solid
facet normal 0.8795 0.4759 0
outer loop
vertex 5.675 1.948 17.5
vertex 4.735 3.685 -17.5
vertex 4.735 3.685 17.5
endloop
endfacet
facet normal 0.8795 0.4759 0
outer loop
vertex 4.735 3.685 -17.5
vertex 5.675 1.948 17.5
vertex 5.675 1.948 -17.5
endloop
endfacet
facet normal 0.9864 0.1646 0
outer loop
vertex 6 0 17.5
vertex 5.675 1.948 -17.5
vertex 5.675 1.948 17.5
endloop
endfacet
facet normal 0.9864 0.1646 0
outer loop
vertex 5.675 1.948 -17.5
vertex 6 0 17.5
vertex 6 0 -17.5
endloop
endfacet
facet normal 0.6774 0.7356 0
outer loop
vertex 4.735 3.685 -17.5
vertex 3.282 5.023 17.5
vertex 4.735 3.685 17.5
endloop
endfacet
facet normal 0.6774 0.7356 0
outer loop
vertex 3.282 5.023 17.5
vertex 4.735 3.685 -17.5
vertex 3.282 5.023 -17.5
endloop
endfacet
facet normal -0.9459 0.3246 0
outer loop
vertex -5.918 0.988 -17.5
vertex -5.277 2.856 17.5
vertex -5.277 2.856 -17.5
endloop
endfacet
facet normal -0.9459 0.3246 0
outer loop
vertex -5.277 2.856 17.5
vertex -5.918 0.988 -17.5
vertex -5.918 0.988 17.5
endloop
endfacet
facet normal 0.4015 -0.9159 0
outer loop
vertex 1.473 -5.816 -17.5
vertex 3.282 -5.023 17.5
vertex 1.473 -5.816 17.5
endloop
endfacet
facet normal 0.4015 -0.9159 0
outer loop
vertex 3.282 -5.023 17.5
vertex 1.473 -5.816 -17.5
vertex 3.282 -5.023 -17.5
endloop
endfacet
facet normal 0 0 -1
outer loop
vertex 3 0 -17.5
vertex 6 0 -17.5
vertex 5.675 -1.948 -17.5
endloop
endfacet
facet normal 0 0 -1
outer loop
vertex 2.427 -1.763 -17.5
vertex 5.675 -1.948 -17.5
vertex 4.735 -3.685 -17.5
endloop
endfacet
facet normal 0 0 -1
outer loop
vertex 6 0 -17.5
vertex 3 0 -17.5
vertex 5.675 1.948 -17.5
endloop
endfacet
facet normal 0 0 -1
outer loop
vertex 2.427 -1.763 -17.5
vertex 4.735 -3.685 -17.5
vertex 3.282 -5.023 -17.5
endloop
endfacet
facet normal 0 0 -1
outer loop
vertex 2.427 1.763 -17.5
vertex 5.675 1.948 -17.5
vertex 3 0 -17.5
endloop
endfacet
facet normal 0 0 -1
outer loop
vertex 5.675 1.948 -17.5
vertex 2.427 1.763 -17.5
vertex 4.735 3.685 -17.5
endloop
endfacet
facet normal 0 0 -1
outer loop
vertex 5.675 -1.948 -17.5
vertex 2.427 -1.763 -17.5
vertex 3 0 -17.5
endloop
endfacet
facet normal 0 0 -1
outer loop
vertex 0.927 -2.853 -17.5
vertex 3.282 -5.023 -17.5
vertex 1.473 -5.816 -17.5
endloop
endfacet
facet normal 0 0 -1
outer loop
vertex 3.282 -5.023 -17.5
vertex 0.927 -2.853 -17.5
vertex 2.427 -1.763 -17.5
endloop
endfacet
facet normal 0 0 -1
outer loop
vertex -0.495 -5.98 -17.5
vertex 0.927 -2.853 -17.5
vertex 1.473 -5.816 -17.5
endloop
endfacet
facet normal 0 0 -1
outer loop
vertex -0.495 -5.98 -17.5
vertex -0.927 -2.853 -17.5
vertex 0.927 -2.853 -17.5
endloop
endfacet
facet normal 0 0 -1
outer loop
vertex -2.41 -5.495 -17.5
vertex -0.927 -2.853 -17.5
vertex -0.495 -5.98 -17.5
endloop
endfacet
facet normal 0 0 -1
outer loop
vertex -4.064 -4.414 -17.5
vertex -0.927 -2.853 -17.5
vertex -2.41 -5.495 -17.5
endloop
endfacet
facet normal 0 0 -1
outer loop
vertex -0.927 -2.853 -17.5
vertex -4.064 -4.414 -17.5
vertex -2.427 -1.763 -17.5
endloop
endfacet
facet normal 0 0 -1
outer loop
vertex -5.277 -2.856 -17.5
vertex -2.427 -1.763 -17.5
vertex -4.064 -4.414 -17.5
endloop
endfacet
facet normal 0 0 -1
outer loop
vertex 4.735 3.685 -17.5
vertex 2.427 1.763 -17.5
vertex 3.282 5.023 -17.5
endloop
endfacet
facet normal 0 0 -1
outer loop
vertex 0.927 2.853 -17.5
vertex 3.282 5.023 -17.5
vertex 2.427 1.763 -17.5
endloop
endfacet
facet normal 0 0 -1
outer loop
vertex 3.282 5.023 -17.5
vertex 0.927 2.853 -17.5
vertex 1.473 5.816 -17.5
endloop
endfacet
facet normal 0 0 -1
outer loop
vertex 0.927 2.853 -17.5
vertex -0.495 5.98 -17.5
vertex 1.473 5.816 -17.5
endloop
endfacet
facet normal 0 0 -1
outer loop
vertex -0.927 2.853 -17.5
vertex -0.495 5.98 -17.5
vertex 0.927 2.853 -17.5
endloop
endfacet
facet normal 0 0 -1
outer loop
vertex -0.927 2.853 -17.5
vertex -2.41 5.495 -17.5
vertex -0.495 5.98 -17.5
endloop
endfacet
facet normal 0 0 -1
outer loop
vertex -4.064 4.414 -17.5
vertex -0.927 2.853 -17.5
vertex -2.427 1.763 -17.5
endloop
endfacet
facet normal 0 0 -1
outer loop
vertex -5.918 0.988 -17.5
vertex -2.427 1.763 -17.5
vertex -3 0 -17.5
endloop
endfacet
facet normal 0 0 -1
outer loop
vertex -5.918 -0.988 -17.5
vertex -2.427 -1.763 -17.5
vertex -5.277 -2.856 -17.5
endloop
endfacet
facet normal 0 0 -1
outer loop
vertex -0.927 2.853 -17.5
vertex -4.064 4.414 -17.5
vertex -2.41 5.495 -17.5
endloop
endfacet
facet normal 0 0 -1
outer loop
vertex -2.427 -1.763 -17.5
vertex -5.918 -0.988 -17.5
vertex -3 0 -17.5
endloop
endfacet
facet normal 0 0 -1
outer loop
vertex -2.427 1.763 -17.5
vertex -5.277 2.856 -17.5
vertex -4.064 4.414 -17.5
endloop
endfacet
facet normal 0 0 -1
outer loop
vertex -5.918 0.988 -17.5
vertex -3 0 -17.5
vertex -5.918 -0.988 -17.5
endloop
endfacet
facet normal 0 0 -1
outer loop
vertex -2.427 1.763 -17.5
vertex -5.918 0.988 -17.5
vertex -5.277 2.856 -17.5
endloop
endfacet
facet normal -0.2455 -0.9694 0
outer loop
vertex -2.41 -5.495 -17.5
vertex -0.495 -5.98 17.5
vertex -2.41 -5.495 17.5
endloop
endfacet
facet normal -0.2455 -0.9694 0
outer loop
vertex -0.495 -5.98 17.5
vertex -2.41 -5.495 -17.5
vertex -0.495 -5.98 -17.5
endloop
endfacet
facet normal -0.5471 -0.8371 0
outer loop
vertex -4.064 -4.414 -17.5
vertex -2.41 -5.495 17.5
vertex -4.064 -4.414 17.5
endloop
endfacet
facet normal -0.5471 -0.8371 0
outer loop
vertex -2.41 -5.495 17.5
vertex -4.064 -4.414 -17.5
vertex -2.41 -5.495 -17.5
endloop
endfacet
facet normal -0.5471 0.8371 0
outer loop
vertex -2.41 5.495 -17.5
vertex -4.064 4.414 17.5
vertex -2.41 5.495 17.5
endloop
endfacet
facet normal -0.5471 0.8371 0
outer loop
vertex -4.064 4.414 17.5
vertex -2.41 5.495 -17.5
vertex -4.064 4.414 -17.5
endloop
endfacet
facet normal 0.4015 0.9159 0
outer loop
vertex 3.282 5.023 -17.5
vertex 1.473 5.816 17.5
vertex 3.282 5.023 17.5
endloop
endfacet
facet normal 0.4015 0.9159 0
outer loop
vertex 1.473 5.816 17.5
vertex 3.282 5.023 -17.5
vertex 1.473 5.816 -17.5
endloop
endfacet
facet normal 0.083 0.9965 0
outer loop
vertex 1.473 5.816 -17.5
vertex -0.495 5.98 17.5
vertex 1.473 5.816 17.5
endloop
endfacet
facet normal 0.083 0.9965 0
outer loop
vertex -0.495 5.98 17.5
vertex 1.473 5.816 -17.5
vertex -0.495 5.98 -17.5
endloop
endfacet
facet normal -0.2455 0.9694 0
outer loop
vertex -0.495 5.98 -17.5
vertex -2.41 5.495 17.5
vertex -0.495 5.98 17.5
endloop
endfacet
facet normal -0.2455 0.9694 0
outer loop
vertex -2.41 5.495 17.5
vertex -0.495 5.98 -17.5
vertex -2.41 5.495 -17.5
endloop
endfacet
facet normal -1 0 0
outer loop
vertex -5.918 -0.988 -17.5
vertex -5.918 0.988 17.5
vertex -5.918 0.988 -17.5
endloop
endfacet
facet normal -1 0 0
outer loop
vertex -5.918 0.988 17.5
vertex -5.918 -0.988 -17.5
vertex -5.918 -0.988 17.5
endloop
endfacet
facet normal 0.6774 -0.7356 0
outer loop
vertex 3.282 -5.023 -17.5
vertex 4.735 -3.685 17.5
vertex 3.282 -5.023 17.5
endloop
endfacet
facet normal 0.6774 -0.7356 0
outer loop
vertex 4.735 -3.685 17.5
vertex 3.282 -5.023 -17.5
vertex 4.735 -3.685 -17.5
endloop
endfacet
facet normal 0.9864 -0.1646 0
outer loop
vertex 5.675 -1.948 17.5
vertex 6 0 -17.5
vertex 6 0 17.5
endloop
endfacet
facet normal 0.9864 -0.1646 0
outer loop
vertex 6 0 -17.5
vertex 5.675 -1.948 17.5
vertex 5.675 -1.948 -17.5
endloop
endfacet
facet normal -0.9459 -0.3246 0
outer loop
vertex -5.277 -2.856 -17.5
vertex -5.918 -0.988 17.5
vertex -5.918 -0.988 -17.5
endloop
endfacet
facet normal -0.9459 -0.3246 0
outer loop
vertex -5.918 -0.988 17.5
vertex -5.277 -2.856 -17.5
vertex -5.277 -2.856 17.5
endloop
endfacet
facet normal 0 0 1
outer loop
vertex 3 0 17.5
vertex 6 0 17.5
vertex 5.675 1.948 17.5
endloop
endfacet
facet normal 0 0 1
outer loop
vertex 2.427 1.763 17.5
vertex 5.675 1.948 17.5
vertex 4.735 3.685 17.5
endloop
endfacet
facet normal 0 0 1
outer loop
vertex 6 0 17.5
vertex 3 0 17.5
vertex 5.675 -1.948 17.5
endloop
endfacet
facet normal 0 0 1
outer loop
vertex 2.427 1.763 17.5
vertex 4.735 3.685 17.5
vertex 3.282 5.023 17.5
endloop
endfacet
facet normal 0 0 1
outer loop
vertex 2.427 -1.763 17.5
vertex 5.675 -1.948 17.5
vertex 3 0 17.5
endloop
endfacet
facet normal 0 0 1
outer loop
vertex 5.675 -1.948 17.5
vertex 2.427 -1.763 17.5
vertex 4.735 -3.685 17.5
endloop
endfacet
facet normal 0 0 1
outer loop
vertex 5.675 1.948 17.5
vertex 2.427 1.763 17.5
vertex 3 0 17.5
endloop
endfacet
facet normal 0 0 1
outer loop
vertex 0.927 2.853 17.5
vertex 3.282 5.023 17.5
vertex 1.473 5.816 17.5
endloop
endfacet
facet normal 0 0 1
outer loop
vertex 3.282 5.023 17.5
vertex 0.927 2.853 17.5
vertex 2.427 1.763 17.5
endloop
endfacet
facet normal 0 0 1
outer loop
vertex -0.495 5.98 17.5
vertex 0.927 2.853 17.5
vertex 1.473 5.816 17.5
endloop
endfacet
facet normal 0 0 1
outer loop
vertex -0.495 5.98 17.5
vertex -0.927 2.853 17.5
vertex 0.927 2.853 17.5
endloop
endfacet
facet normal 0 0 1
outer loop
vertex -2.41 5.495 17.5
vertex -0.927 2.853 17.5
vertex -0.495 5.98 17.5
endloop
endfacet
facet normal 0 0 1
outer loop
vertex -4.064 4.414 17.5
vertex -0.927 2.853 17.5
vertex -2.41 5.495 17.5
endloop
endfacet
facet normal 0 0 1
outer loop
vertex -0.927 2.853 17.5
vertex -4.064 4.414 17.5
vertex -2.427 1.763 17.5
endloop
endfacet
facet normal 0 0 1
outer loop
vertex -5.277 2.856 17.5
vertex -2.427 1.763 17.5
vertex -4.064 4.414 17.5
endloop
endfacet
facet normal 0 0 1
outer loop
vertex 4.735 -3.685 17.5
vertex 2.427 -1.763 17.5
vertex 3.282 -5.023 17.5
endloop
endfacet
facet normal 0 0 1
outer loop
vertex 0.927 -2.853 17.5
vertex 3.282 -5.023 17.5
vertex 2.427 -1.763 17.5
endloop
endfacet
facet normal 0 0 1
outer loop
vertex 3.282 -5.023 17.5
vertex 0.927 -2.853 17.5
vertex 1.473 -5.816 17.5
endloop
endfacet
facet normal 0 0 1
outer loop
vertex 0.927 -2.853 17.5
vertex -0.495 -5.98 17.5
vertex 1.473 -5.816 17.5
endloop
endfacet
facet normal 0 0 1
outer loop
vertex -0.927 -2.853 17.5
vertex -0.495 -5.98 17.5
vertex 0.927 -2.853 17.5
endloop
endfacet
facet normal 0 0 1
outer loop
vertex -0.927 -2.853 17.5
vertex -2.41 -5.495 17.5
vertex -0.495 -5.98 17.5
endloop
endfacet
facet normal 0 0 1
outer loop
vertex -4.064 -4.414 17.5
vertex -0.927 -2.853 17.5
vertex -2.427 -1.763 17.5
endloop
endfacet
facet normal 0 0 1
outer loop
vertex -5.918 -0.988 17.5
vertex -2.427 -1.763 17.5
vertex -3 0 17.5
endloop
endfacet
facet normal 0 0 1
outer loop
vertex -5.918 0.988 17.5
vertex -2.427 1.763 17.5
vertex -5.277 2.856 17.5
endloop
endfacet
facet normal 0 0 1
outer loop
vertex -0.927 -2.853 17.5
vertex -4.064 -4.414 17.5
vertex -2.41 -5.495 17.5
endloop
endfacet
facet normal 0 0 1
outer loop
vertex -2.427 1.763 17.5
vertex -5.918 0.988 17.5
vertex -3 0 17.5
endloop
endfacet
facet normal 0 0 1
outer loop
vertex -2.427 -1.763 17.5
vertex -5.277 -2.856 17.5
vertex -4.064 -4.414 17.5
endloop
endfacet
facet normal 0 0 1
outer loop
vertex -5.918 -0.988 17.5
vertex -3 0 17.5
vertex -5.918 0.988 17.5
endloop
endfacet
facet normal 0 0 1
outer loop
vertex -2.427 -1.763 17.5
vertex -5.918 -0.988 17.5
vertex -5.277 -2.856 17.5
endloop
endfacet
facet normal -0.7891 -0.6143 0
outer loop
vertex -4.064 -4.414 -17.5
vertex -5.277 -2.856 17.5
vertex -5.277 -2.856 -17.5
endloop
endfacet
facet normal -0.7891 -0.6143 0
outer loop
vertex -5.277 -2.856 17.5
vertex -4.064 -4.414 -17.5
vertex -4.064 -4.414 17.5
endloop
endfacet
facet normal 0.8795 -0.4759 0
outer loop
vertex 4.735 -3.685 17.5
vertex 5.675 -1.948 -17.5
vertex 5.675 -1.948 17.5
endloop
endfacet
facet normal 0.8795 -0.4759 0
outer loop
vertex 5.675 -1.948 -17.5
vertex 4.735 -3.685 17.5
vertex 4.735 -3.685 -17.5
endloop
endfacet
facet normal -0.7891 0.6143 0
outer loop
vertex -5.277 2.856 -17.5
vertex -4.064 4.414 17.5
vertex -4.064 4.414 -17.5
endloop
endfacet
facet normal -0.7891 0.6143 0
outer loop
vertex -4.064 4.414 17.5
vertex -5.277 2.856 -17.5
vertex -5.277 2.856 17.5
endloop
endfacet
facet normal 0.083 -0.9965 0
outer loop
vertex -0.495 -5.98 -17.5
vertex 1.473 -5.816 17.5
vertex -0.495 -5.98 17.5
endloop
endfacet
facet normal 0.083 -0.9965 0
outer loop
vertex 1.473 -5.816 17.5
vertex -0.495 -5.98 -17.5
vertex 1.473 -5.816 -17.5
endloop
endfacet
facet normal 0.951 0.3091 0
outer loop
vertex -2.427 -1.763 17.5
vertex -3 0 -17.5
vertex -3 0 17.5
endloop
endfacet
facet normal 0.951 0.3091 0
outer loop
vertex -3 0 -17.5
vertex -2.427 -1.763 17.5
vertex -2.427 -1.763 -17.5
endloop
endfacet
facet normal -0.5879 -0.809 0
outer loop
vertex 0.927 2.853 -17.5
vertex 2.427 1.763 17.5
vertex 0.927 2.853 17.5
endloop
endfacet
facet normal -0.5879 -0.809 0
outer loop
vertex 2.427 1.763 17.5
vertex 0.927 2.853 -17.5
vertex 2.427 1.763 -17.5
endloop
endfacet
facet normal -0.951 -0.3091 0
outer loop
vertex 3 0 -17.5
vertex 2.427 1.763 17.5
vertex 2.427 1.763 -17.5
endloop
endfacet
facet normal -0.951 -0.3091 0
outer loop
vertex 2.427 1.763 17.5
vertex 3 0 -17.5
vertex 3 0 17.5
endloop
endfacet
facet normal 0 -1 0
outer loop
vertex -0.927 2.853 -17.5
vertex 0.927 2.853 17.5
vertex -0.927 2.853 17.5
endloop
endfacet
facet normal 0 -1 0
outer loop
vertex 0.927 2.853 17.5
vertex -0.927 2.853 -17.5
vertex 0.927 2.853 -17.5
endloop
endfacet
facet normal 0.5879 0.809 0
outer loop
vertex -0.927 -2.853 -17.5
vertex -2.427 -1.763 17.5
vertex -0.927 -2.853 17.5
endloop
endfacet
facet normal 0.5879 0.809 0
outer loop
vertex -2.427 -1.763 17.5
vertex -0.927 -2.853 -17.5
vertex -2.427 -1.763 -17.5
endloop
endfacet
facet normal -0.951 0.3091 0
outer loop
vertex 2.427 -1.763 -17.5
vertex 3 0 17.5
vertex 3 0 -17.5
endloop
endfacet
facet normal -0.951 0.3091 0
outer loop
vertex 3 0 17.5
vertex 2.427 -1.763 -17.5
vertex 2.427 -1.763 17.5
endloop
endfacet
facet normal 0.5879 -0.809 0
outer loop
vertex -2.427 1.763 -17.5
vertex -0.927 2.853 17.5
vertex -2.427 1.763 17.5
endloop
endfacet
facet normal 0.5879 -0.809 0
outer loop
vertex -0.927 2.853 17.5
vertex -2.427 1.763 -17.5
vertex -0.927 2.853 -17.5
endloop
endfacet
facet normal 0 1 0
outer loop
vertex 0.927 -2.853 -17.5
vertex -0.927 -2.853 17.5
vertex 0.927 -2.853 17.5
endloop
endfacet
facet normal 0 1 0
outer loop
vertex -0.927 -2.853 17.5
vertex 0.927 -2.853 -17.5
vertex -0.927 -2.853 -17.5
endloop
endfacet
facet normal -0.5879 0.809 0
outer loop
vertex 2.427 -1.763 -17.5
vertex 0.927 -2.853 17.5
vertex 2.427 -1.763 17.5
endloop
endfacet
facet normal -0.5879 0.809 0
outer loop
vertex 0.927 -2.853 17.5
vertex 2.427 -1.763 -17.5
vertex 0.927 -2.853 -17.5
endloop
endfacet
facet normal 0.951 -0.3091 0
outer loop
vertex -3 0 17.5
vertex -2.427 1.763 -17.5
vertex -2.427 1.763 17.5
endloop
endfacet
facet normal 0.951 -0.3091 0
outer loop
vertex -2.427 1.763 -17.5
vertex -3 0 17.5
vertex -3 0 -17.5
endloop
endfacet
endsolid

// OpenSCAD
// Linear Bearing (Bushing) Parameters
outer_diameter = 12.0;
inner_diameter = 6.0;
length = 35.0;

// Linear Bearing Body
module linear_bearing_body() {
    cylinder(d = outer_diameter, h = length, center = true);
}

// Through Bore
module through_bore() {
    cylinder(d = inner_diameter, h = length + 2, center = true);
}

// Linear Bearing Assembly
module linear_bearing() {
    difference() {
        linear_bearing_body();
        through_bore();
    }
}

// Render the Linear Bearing
linear_bearing();
